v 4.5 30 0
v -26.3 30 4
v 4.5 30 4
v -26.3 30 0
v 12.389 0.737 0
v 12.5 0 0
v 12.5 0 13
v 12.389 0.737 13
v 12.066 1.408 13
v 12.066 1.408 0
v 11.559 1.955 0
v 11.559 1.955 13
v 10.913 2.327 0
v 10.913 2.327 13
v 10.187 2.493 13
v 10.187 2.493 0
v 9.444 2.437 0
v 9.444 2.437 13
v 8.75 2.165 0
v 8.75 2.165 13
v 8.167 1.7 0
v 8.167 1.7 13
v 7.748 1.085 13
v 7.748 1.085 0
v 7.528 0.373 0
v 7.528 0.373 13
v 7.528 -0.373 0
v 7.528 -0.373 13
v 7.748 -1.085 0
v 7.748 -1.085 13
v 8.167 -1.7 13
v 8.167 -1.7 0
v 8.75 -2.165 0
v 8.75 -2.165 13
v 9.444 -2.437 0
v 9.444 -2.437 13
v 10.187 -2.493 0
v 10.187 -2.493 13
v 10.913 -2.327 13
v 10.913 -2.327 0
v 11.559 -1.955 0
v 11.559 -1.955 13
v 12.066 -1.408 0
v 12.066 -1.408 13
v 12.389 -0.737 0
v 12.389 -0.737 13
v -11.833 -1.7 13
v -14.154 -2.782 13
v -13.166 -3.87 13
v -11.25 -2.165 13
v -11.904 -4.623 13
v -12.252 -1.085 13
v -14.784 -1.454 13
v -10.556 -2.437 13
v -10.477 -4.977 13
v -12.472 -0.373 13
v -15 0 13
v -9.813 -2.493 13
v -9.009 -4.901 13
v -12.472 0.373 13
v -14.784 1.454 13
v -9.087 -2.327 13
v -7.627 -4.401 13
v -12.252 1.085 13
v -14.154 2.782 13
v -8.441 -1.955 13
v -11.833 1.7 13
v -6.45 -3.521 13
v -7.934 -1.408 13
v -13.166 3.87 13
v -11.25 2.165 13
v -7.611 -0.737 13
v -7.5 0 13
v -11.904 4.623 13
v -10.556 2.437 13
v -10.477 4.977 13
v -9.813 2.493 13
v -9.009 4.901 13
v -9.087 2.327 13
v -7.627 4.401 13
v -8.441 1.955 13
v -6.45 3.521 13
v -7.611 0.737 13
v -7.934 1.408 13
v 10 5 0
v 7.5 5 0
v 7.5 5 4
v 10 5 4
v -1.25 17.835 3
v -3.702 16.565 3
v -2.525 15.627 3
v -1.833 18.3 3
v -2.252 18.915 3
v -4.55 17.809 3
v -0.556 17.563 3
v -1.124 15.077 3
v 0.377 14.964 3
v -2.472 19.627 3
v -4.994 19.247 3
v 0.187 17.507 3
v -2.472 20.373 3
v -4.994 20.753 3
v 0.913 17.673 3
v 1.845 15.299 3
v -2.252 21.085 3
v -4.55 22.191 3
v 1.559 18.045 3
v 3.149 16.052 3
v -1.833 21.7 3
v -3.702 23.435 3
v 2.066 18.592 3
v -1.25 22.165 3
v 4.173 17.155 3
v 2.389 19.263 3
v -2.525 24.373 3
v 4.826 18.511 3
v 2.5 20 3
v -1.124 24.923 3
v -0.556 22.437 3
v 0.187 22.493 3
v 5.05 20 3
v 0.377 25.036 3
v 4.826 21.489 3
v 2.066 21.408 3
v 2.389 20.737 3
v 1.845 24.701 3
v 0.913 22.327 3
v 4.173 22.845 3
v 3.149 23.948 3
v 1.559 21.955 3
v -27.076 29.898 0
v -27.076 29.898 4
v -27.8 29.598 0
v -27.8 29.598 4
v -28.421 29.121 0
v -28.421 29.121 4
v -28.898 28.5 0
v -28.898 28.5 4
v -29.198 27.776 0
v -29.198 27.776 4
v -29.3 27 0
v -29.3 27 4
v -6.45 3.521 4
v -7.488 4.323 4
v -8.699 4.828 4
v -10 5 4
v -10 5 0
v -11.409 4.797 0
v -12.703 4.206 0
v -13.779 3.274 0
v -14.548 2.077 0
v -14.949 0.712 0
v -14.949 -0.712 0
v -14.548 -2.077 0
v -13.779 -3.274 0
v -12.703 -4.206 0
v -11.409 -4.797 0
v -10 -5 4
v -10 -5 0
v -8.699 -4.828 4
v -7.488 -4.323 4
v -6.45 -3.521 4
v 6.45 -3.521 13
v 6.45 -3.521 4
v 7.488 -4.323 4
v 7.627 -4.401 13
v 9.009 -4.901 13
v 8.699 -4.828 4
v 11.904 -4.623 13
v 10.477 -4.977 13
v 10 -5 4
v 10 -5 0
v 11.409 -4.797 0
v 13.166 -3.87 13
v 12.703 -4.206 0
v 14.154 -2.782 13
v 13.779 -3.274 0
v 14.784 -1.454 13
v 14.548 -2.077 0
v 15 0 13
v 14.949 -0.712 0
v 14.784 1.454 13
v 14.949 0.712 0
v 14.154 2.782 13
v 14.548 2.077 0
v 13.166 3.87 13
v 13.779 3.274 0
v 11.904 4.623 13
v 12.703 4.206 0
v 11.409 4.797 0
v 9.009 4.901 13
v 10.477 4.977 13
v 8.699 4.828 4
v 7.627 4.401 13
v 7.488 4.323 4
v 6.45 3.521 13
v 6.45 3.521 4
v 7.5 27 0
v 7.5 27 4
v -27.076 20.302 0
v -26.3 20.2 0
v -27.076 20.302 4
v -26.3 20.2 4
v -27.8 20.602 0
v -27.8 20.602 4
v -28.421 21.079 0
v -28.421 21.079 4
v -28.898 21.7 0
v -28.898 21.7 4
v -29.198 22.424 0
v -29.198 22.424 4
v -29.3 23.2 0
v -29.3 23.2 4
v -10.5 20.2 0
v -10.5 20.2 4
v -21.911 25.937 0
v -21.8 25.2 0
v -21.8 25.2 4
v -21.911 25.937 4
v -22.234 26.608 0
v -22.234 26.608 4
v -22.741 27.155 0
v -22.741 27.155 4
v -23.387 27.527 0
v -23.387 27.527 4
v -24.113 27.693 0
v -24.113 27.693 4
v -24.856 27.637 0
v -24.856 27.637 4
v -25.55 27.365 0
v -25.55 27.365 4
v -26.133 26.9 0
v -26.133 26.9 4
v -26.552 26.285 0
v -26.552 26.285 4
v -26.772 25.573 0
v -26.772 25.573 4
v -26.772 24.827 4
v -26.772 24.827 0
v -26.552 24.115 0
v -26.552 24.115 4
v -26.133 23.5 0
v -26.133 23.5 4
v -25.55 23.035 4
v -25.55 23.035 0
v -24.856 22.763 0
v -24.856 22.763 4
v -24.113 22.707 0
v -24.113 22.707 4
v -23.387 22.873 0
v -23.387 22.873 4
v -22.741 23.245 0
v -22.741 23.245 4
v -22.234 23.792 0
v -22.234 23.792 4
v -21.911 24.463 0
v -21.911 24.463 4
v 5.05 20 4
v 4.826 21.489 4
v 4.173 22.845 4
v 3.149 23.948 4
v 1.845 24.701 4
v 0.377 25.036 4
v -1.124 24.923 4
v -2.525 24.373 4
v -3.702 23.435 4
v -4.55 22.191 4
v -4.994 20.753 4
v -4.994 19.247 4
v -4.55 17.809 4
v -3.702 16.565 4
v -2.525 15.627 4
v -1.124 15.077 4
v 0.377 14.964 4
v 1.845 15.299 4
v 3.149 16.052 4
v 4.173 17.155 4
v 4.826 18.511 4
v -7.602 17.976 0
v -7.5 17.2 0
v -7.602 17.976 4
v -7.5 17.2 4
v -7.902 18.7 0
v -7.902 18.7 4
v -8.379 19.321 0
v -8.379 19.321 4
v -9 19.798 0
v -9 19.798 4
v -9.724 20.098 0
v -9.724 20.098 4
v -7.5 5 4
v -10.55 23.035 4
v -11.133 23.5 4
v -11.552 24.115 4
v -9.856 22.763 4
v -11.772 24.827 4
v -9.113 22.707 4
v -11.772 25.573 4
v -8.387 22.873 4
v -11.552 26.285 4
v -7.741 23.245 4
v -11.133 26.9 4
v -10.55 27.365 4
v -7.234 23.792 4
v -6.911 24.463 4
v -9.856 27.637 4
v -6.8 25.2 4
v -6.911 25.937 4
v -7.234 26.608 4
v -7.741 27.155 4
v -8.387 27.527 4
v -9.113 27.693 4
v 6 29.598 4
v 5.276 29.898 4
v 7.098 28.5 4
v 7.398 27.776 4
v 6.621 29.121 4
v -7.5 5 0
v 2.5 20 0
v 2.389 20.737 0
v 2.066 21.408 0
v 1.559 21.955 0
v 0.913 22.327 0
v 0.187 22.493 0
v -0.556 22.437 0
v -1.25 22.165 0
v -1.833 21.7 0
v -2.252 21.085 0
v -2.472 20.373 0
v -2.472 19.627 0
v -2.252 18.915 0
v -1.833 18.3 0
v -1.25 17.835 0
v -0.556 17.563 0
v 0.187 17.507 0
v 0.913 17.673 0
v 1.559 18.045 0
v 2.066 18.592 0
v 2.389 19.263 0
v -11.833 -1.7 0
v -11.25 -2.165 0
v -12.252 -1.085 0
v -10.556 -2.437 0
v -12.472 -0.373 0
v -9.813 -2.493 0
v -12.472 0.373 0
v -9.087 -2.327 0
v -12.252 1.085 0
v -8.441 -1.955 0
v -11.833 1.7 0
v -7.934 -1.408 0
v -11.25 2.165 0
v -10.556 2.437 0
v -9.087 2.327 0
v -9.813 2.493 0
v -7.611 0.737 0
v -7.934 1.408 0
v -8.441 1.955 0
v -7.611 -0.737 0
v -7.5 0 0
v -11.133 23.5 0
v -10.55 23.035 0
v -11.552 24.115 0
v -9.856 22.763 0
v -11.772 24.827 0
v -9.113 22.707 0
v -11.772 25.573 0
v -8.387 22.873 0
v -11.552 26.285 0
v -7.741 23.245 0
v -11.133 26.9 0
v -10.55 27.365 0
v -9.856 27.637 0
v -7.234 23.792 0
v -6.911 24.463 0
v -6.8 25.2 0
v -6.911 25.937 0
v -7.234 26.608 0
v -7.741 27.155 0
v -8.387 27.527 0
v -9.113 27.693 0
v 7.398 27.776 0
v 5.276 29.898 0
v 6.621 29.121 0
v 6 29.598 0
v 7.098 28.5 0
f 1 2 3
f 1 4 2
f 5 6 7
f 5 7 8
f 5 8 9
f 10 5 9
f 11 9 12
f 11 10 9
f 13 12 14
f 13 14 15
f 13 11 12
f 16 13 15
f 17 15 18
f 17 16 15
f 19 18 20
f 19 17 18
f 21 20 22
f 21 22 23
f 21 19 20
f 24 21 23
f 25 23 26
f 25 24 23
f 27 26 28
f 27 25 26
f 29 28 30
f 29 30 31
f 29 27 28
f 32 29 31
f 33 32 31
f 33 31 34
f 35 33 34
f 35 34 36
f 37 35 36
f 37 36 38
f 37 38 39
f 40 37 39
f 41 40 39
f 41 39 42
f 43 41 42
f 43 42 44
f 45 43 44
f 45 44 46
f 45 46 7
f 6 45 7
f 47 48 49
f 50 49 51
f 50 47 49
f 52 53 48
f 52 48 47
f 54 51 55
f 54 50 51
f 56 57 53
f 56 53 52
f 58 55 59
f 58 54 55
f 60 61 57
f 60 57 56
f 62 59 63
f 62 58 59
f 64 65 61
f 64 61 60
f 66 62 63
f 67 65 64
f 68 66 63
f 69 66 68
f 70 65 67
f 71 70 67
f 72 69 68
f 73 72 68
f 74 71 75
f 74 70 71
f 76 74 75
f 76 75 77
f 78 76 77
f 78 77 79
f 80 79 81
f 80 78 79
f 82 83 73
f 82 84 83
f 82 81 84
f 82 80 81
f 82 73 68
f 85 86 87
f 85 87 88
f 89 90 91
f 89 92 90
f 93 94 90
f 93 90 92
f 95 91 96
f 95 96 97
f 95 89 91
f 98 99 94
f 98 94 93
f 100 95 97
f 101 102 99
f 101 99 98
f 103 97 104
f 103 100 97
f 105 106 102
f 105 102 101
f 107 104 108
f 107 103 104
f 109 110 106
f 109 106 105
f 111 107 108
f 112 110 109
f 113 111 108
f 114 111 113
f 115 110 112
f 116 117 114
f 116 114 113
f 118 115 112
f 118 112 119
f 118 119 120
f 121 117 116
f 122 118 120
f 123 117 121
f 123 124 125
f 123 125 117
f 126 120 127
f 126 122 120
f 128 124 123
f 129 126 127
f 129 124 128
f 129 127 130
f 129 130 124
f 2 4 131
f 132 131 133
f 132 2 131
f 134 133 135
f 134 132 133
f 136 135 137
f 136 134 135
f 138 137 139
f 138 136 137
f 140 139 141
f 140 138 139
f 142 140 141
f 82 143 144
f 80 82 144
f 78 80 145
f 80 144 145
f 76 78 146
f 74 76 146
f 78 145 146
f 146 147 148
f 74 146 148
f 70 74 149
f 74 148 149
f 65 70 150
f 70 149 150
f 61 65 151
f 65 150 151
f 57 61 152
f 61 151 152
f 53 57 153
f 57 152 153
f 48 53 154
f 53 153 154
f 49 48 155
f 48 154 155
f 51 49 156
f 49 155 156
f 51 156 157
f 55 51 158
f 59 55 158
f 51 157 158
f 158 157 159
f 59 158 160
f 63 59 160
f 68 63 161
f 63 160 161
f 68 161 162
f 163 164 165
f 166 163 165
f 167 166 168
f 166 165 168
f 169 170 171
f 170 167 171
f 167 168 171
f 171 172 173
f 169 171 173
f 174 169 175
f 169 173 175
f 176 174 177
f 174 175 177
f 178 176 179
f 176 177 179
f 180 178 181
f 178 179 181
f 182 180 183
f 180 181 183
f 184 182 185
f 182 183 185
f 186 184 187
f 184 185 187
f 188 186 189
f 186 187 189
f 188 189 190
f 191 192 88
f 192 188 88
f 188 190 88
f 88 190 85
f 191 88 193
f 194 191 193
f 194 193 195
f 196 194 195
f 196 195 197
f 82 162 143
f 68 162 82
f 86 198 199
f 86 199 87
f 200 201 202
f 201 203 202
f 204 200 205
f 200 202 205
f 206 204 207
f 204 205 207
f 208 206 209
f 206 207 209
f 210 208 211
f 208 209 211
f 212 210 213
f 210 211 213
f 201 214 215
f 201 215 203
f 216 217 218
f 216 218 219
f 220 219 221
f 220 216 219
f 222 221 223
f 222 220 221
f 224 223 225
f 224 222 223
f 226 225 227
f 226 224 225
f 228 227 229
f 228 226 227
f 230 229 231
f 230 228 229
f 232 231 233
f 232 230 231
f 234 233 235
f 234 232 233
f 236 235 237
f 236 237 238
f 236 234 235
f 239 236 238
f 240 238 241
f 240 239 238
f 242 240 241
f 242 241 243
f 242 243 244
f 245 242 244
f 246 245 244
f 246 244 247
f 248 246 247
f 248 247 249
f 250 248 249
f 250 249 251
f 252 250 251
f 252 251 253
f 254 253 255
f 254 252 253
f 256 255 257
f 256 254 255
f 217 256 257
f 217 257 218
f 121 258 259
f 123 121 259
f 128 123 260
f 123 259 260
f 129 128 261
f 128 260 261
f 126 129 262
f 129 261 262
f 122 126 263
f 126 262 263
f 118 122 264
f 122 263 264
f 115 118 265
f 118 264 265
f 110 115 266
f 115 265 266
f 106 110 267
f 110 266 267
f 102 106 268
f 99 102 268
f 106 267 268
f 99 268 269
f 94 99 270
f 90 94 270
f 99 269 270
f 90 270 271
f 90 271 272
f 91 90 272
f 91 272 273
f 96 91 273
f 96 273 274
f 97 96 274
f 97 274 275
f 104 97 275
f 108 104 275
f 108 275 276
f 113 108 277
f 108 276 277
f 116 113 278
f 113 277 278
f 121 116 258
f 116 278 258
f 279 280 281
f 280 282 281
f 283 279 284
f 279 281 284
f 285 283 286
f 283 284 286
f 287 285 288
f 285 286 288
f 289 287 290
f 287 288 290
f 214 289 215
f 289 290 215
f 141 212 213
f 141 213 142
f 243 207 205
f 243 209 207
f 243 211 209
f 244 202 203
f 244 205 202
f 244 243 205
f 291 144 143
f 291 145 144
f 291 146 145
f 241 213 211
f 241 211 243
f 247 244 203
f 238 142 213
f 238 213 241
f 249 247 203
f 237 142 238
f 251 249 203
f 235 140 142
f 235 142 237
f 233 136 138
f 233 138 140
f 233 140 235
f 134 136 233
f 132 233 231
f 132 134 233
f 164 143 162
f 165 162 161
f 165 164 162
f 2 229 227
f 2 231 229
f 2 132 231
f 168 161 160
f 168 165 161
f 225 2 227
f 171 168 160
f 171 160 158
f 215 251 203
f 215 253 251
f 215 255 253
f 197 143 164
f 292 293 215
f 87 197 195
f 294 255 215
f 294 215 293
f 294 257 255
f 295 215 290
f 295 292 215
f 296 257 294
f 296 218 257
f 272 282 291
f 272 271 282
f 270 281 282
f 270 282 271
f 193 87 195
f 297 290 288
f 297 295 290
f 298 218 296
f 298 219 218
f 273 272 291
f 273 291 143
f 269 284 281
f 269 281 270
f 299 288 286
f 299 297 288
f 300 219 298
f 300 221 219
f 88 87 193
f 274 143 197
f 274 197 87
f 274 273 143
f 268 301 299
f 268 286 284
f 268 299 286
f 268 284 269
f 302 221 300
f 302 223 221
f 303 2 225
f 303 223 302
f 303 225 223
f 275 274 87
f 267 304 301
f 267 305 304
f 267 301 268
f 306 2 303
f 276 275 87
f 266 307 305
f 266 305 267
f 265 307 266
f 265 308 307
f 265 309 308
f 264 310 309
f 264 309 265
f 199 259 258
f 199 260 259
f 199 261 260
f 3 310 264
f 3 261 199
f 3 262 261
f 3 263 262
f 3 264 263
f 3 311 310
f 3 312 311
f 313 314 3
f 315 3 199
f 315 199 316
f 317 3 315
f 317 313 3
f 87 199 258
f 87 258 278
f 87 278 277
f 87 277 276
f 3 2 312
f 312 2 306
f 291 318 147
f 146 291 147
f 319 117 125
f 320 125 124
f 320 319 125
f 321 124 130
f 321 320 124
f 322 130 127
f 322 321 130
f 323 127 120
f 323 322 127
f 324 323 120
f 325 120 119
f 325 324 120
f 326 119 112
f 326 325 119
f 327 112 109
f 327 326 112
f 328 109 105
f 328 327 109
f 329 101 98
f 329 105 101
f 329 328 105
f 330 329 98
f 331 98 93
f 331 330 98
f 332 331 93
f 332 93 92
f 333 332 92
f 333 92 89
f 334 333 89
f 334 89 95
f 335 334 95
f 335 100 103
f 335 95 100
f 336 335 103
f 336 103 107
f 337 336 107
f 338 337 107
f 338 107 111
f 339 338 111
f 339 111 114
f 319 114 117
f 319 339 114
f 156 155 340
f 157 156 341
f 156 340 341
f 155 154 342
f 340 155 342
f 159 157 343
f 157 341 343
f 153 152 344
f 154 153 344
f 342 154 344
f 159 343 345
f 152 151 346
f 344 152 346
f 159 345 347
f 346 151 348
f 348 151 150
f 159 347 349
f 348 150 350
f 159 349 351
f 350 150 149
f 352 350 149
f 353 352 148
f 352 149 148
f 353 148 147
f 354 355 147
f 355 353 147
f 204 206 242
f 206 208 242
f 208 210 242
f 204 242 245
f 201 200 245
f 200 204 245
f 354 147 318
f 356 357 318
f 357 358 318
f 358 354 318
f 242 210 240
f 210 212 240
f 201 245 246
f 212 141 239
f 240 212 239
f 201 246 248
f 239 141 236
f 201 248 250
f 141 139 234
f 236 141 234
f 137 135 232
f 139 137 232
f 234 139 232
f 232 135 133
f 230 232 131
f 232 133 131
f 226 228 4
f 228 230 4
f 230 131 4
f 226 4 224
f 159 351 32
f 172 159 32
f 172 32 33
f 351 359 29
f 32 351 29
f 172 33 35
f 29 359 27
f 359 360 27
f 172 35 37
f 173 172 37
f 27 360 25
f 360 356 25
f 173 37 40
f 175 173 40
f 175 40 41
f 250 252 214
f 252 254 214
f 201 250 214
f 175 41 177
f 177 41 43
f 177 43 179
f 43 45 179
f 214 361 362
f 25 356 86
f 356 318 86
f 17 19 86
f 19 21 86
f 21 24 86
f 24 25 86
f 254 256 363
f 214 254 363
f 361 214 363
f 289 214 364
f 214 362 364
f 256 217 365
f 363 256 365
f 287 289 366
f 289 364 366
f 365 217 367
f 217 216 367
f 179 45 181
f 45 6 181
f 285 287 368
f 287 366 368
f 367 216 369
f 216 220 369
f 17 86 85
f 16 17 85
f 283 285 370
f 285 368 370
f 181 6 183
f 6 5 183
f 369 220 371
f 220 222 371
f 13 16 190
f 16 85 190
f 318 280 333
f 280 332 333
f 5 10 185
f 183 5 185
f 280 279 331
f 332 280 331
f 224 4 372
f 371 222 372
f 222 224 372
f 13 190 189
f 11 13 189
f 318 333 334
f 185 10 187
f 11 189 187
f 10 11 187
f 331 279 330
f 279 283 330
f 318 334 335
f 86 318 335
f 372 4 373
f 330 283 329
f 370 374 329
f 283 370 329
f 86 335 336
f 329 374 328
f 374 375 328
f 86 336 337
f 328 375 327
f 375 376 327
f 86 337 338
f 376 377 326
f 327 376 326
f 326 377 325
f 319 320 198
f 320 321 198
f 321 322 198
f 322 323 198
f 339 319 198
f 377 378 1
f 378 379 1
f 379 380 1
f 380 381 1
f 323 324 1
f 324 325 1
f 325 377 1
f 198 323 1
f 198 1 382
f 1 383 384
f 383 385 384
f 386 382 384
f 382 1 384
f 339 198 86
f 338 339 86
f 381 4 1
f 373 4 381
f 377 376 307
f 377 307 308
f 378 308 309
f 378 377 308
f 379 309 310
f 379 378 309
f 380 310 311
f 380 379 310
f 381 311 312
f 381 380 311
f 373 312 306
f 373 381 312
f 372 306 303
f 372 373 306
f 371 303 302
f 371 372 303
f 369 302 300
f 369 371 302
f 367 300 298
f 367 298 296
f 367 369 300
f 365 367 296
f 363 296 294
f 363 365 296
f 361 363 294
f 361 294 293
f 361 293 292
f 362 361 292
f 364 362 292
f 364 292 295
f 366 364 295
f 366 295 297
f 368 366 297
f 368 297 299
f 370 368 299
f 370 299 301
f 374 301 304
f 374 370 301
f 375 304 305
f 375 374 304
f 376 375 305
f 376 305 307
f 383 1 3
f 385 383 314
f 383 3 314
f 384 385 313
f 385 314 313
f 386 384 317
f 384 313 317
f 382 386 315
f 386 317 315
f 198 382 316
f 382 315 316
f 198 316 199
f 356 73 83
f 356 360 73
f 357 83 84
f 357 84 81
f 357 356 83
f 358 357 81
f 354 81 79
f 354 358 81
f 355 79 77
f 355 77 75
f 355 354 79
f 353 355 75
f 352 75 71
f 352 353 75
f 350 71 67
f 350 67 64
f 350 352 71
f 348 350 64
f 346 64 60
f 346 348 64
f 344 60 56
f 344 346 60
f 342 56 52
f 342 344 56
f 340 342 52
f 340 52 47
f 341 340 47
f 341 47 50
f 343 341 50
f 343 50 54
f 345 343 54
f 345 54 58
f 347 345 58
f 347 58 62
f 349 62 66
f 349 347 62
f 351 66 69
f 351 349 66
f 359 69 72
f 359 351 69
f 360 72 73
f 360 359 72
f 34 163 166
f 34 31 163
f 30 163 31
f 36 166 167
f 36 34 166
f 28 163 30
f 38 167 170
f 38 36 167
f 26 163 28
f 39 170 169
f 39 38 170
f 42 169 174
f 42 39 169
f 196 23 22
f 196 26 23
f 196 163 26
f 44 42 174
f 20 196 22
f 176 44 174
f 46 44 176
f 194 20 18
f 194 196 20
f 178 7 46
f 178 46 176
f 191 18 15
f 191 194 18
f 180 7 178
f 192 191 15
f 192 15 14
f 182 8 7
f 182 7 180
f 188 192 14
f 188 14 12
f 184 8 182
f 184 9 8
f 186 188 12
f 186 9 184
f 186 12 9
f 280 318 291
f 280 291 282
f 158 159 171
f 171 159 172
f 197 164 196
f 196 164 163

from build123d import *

# Parameters (mm, degrees)
SKETCH_R          = 2.5
PAD_DEPTH         = 4
SKETCH003_R       = 5
SKETCH003_R_2     = 2.5
PAD001_DEPTH      = 9
SKETCH002_W       = 12.9
SKETCH002_H       = 16.151024
POCKET_DEPTH      = 30.001
POCKET_DEPTH_BACK = 5.001
FILLET_R          = 3
SKETCH004_R       = 5.05
POCKET001_DEPTH   = 1


with BuildPart() as part:
    # Sketch → Pad (new body)
    with BuildSketch(Plane.XY):
        with BuildLine():
            Line((-10, -5), (10, -5))
            ThreePointArc((10, -5), (15, 0), (10, 5))
            Line((7.5, 5), (10, 5))
            Line((7.5, 30), (7.5, 5))
            Line((-7.5, 30), (7.5, 30))
            Line((-29.3, 30), (-7.5, 30))
            Line((-29.3, 20.2), (-29.3, 30))
            Line((-7.5, 20.2), (-29.3, 20.2))
            Line((-7.5, 5), (-7.5, 20.2))
            Line((-7.5, 5), (-10.000009, 5))
            ThreePointArc((-10.000009, 5), (-15, -4e-06), (-10, -5))
        make_face()
        with Locations((-10, 0)):
            Circle(SKETCH_R, mode=Mode.SUBTRACT)
        with Locations((10, 0)):
            Circle(SKETCH_R, mode=Mode.SUBTRACT)
        with Locations((0, 20)):
            Circle(SKETCH_R, mode=Mode.SUBTRACT)
        with Locations((-9.3, 25.2)):
            Circle(SKETCH_R, mode=Mode.SUBTRACT)
        with Locations((-24.3, 25.2)):
            Circle(SKETCH_R, mode=Mode.SUBTRACT)
    extrude(amount=PAD_DEPTH)

    # Sketch003 (on DatumPlane) → Pad001 (join)
    with BuildSketch(Plane.XY.offset(4)):
        with Locations((-10, 0)):
            Circle(SKETCH003_R)
        with Locations((-10, 0)):
            Circle(SKETCH003_R_2, mode=Mode.SUBTRACT)
        with Locations((10, 0)):
            Circle(SKETCH003_R)
        with Locations((10, 0)):
            Circle(SKETCH003_R_2, mode=Mode.SUBTRACT)
    extrude(amount=PAD001_DEPTH)

    # Sketch002 → Pocket (cut, two sides)
    with BuildSketch(Plane.XZ) as pocket_sk:
        with Locations((0, 12.075512)):
            Rectangle(SKETCH002_W, SKETCH002_H)
    extrude(amount=-POCKET_DEPTH, mode=Mode.SUBTRACT)
    extrude(pocket_sk.sketch, amount=POCKET_DEPTH_BACK, mode=Mode.SUBTRACT)

    # Fillet
    fillet_edges = [part.edges().sort_by_distance(p)[0] for p in [
        (-29.3, 20.2, 2),
        (-29.3, 30, 2),
        (-7.5, 20.2, 2),
        (7.5, 30, 2),
    ]]
    fillet(fillet_edges, radius=FILLET_R)

    # Sketch004 (on Face5 of Fillet) → Pocket001 (cut)
    with BuildSketch(Plane.XY.offset(4)):
        with Locations((0, 20)):
            Circle(SKETCH004_R)
    extrude(amount=-POCKET001_DEPTH, mode=Mode.SUBTRACT)


solid = part.part
